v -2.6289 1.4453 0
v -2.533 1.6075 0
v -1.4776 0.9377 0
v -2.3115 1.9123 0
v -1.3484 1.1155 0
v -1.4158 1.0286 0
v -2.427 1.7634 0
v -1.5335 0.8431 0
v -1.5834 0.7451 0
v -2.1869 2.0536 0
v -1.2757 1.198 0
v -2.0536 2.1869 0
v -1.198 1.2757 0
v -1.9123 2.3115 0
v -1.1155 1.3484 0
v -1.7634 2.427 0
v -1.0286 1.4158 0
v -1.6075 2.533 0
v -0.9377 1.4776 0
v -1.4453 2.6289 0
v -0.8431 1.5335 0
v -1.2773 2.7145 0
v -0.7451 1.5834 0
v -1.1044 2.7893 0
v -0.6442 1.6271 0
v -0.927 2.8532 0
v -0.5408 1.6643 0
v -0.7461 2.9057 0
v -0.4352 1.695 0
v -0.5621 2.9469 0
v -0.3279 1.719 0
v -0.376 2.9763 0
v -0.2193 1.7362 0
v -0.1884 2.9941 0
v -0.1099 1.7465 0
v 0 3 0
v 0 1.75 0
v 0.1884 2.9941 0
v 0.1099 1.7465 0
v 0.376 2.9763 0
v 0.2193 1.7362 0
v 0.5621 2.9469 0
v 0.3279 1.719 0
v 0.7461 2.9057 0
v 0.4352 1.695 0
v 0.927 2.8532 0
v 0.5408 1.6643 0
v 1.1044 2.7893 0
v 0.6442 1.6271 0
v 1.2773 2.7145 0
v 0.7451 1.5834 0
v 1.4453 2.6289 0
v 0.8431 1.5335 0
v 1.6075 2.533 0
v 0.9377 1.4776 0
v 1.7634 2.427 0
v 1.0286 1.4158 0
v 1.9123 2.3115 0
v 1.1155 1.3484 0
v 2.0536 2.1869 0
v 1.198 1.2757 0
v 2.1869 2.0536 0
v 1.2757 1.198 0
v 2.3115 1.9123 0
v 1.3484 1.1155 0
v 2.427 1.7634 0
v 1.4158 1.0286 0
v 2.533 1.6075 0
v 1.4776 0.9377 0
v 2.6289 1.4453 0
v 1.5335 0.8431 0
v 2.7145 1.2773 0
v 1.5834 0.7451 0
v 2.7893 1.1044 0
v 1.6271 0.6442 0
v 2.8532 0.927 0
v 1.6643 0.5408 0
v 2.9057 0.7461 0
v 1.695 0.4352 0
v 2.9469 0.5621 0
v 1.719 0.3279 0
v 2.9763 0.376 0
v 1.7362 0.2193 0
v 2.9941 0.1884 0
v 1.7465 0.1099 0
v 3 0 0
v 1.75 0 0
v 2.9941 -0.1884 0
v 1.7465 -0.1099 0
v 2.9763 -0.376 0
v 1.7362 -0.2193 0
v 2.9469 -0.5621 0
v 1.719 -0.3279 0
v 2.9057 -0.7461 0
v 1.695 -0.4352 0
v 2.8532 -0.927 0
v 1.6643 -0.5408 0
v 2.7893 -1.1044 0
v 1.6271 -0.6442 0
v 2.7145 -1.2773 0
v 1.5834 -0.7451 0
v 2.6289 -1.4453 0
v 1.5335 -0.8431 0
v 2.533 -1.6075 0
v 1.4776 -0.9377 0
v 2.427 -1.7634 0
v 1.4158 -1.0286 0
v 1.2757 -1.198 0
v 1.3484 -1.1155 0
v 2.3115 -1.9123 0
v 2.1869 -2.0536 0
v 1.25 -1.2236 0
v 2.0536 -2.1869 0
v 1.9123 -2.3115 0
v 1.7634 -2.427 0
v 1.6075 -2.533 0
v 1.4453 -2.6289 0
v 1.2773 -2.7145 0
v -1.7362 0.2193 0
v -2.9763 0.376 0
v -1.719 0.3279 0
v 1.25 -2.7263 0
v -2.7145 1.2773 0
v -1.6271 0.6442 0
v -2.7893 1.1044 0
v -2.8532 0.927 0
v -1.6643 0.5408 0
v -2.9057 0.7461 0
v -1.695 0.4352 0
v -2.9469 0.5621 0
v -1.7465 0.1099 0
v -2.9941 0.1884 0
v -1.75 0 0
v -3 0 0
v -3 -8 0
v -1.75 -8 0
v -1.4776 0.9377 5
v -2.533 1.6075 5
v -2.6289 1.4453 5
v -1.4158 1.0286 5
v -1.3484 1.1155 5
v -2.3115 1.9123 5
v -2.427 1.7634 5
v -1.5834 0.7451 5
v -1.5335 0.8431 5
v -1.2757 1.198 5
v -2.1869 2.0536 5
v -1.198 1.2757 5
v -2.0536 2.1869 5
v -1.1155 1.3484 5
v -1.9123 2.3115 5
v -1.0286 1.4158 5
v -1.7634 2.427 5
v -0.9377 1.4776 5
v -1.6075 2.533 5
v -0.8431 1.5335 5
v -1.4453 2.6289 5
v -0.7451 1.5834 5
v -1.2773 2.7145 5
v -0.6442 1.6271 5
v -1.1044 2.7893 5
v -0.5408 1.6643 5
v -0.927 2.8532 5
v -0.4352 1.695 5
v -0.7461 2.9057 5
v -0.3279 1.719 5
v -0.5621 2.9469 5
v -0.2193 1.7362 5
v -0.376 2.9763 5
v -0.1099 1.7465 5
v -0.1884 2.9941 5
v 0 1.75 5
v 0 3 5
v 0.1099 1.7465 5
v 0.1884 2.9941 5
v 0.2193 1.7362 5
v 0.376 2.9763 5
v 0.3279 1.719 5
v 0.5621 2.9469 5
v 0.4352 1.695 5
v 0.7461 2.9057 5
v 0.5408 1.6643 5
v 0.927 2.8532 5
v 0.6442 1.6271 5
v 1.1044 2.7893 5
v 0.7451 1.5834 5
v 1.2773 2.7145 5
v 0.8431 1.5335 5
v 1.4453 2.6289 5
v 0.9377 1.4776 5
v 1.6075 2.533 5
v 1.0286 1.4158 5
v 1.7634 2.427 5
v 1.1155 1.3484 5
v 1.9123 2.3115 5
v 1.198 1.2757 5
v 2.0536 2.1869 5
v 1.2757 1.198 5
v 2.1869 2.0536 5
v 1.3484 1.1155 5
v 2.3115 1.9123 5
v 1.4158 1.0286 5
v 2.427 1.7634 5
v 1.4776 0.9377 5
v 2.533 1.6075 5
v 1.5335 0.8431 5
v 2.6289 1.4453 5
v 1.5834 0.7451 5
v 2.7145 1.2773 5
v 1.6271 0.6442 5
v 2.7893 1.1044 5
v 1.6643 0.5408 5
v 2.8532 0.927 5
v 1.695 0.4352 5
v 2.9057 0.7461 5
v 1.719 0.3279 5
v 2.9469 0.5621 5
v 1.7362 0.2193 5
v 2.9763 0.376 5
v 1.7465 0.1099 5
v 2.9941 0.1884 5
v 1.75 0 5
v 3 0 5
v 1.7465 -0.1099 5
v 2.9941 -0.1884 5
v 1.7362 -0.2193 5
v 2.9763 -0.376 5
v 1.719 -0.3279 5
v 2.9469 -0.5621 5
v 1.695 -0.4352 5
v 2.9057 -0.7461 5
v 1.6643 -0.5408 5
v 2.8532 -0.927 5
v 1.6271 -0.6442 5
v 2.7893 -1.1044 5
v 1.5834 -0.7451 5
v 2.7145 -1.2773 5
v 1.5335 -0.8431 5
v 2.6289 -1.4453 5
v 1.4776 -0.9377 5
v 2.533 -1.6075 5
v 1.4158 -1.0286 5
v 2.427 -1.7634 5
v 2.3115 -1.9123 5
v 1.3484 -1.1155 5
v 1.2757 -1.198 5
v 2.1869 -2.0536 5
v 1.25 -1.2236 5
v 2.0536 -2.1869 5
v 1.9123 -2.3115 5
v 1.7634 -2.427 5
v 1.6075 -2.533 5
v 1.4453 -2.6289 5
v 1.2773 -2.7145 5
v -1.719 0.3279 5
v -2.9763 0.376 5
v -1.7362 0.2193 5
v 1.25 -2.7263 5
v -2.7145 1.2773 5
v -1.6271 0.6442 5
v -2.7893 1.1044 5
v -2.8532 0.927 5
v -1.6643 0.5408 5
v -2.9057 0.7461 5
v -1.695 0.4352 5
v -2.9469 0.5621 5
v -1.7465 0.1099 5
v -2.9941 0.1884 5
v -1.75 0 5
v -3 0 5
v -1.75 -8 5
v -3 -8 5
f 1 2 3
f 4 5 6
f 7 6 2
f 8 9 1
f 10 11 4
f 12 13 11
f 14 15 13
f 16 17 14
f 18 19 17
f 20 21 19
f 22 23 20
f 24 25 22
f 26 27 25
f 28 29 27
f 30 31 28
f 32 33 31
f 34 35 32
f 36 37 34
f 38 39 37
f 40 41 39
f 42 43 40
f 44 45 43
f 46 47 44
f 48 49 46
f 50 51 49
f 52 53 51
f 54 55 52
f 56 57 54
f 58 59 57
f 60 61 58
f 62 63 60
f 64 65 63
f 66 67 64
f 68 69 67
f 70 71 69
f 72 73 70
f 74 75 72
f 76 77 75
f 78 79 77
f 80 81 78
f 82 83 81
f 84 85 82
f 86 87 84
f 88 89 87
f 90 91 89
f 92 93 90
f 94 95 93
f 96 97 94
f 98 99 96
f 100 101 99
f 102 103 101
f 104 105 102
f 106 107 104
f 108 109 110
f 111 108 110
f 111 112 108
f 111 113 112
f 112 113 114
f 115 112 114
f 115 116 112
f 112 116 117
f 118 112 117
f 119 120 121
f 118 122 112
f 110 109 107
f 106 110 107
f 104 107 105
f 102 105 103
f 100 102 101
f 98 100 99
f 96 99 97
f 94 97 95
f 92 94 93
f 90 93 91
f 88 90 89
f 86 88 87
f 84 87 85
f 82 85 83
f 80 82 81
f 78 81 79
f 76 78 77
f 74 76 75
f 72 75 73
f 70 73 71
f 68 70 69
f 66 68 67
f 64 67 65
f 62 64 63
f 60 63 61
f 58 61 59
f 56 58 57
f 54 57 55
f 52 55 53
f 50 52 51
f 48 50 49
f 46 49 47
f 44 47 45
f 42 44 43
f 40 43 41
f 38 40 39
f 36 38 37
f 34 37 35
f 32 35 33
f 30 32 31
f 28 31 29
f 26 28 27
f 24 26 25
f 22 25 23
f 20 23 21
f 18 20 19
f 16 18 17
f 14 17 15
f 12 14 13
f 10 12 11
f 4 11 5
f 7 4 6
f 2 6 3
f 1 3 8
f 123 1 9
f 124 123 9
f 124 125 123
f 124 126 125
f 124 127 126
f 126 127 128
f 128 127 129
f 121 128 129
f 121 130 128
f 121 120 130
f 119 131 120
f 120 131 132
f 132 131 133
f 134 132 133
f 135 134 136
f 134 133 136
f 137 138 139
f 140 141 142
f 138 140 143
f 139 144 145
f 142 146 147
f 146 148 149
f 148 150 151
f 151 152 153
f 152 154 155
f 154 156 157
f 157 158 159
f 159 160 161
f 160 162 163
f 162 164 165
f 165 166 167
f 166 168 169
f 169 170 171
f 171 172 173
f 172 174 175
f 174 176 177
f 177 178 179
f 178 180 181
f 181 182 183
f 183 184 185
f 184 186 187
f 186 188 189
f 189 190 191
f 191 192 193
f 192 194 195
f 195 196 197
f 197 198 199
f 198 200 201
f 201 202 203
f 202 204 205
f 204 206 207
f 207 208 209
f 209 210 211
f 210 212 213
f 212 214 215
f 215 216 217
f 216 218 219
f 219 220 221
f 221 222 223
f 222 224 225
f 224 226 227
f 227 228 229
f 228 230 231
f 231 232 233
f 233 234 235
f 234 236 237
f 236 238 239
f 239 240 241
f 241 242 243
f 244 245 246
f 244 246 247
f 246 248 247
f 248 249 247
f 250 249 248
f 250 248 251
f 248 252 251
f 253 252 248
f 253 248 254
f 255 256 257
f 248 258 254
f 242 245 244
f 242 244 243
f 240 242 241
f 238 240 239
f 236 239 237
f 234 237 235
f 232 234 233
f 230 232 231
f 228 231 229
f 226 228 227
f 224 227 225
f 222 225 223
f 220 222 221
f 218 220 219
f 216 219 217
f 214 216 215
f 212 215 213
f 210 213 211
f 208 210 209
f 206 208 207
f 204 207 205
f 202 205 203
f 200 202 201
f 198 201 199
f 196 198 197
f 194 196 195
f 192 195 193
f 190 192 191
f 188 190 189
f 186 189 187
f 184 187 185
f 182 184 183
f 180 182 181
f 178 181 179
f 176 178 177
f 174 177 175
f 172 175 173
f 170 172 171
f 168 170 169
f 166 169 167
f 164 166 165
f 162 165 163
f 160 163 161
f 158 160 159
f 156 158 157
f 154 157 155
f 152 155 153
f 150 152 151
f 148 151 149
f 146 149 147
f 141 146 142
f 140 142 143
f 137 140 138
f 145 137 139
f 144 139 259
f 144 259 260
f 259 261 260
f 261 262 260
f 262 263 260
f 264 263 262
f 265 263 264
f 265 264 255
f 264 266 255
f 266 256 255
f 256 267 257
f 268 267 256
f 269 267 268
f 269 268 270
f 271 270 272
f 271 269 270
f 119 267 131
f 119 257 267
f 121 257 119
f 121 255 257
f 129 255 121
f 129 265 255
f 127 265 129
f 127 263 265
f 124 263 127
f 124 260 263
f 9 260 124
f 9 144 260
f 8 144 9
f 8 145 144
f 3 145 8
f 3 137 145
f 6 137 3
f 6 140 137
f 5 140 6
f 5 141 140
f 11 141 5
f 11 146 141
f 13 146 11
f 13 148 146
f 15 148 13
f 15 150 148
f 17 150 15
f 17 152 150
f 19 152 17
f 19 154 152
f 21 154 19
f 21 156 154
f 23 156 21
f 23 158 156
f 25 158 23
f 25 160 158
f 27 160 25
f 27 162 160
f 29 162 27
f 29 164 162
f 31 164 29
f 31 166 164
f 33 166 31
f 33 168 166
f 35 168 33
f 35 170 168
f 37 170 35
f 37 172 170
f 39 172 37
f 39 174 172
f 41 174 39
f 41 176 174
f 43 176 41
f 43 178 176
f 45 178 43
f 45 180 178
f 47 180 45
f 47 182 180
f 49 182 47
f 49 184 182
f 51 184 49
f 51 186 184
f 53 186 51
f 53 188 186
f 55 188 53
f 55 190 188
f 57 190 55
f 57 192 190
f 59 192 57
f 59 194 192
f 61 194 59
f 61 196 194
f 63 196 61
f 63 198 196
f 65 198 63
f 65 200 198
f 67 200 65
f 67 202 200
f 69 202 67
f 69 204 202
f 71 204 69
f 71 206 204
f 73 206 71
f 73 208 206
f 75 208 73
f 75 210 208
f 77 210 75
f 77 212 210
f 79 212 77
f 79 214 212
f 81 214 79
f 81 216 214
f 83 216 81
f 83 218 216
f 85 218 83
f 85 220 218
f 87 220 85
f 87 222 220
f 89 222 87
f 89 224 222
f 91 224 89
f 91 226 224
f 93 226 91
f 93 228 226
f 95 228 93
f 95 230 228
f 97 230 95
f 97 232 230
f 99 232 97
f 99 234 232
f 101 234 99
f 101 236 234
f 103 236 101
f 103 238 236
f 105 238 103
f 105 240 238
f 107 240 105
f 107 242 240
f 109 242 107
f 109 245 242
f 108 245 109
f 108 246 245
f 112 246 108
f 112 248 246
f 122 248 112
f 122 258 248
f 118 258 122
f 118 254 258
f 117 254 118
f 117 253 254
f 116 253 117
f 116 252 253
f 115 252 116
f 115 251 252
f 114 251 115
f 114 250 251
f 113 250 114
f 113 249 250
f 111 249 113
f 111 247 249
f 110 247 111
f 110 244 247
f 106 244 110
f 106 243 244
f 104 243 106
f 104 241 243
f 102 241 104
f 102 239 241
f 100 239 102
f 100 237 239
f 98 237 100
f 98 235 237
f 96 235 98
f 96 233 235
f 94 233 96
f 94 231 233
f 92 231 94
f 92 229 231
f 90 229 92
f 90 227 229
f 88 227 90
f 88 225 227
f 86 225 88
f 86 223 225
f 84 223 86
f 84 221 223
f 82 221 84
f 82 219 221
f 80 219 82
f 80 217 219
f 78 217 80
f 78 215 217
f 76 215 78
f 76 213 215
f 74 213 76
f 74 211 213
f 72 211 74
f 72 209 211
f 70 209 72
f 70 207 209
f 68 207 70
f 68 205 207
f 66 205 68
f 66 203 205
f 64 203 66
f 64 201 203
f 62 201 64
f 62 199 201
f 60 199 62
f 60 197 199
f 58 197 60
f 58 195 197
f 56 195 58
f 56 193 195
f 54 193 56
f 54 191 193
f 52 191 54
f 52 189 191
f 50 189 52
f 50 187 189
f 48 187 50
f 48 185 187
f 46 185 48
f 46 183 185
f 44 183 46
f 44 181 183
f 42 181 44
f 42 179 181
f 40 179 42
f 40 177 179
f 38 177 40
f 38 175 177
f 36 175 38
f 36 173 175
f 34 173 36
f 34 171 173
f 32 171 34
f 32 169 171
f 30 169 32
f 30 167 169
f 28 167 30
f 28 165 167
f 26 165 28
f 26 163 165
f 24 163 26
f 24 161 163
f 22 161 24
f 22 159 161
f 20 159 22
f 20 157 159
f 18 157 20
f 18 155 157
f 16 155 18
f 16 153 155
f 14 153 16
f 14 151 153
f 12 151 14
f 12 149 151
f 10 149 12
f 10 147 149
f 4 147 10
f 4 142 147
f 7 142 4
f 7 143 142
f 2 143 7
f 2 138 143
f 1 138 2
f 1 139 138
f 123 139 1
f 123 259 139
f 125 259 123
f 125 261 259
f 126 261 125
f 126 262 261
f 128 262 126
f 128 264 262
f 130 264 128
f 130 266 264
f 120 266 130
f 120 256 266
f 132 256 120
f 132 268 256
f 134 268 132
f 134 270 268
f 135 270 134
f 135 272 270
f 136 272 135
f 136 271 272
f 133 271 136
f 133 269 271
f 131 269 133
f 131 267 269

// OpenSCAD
// file: Properties.scad
resulution = 100;

stand_thikness = 5;
stand_width = 20;
stand_depth = 30;

headphone_widht = 25;
headphone_heigth = 9;

table_width = 22;
table_stand_height = 50;
table_plate_support_insert = 12;
table_plate_support_height = 40;

cable_diameter = 3.5;
cable_holder_diameter = 6;
cable_stand_thikness = (cable_holder_diameter - cable_diameter) /2;
cable_stand_width = 5;
// main file
include <Properties.scad>;

CableHolder();

module CableHolder(){
    linear_extrude(height = cable_stand_width){
        CableHolderSideView();
    }
}

module CableHolderSideView(){
    rotate([0,0,180])
        difference(){
            CableHolderSideViewBase();
            circle(cable_diameter/2, $fn=resulution);
            translate([-1.25, 0, 0])
                square([3, 3], false);
        }
}

module CableHolderSideViewBase(){
    circle(cable_holder_diameter/2,  $fn=resulution);
    translate([cable_diameter/2, 0, 0])
        square([cable_stand_thikness, stand_thikness + cable_holder_diameter/2], false);
}
